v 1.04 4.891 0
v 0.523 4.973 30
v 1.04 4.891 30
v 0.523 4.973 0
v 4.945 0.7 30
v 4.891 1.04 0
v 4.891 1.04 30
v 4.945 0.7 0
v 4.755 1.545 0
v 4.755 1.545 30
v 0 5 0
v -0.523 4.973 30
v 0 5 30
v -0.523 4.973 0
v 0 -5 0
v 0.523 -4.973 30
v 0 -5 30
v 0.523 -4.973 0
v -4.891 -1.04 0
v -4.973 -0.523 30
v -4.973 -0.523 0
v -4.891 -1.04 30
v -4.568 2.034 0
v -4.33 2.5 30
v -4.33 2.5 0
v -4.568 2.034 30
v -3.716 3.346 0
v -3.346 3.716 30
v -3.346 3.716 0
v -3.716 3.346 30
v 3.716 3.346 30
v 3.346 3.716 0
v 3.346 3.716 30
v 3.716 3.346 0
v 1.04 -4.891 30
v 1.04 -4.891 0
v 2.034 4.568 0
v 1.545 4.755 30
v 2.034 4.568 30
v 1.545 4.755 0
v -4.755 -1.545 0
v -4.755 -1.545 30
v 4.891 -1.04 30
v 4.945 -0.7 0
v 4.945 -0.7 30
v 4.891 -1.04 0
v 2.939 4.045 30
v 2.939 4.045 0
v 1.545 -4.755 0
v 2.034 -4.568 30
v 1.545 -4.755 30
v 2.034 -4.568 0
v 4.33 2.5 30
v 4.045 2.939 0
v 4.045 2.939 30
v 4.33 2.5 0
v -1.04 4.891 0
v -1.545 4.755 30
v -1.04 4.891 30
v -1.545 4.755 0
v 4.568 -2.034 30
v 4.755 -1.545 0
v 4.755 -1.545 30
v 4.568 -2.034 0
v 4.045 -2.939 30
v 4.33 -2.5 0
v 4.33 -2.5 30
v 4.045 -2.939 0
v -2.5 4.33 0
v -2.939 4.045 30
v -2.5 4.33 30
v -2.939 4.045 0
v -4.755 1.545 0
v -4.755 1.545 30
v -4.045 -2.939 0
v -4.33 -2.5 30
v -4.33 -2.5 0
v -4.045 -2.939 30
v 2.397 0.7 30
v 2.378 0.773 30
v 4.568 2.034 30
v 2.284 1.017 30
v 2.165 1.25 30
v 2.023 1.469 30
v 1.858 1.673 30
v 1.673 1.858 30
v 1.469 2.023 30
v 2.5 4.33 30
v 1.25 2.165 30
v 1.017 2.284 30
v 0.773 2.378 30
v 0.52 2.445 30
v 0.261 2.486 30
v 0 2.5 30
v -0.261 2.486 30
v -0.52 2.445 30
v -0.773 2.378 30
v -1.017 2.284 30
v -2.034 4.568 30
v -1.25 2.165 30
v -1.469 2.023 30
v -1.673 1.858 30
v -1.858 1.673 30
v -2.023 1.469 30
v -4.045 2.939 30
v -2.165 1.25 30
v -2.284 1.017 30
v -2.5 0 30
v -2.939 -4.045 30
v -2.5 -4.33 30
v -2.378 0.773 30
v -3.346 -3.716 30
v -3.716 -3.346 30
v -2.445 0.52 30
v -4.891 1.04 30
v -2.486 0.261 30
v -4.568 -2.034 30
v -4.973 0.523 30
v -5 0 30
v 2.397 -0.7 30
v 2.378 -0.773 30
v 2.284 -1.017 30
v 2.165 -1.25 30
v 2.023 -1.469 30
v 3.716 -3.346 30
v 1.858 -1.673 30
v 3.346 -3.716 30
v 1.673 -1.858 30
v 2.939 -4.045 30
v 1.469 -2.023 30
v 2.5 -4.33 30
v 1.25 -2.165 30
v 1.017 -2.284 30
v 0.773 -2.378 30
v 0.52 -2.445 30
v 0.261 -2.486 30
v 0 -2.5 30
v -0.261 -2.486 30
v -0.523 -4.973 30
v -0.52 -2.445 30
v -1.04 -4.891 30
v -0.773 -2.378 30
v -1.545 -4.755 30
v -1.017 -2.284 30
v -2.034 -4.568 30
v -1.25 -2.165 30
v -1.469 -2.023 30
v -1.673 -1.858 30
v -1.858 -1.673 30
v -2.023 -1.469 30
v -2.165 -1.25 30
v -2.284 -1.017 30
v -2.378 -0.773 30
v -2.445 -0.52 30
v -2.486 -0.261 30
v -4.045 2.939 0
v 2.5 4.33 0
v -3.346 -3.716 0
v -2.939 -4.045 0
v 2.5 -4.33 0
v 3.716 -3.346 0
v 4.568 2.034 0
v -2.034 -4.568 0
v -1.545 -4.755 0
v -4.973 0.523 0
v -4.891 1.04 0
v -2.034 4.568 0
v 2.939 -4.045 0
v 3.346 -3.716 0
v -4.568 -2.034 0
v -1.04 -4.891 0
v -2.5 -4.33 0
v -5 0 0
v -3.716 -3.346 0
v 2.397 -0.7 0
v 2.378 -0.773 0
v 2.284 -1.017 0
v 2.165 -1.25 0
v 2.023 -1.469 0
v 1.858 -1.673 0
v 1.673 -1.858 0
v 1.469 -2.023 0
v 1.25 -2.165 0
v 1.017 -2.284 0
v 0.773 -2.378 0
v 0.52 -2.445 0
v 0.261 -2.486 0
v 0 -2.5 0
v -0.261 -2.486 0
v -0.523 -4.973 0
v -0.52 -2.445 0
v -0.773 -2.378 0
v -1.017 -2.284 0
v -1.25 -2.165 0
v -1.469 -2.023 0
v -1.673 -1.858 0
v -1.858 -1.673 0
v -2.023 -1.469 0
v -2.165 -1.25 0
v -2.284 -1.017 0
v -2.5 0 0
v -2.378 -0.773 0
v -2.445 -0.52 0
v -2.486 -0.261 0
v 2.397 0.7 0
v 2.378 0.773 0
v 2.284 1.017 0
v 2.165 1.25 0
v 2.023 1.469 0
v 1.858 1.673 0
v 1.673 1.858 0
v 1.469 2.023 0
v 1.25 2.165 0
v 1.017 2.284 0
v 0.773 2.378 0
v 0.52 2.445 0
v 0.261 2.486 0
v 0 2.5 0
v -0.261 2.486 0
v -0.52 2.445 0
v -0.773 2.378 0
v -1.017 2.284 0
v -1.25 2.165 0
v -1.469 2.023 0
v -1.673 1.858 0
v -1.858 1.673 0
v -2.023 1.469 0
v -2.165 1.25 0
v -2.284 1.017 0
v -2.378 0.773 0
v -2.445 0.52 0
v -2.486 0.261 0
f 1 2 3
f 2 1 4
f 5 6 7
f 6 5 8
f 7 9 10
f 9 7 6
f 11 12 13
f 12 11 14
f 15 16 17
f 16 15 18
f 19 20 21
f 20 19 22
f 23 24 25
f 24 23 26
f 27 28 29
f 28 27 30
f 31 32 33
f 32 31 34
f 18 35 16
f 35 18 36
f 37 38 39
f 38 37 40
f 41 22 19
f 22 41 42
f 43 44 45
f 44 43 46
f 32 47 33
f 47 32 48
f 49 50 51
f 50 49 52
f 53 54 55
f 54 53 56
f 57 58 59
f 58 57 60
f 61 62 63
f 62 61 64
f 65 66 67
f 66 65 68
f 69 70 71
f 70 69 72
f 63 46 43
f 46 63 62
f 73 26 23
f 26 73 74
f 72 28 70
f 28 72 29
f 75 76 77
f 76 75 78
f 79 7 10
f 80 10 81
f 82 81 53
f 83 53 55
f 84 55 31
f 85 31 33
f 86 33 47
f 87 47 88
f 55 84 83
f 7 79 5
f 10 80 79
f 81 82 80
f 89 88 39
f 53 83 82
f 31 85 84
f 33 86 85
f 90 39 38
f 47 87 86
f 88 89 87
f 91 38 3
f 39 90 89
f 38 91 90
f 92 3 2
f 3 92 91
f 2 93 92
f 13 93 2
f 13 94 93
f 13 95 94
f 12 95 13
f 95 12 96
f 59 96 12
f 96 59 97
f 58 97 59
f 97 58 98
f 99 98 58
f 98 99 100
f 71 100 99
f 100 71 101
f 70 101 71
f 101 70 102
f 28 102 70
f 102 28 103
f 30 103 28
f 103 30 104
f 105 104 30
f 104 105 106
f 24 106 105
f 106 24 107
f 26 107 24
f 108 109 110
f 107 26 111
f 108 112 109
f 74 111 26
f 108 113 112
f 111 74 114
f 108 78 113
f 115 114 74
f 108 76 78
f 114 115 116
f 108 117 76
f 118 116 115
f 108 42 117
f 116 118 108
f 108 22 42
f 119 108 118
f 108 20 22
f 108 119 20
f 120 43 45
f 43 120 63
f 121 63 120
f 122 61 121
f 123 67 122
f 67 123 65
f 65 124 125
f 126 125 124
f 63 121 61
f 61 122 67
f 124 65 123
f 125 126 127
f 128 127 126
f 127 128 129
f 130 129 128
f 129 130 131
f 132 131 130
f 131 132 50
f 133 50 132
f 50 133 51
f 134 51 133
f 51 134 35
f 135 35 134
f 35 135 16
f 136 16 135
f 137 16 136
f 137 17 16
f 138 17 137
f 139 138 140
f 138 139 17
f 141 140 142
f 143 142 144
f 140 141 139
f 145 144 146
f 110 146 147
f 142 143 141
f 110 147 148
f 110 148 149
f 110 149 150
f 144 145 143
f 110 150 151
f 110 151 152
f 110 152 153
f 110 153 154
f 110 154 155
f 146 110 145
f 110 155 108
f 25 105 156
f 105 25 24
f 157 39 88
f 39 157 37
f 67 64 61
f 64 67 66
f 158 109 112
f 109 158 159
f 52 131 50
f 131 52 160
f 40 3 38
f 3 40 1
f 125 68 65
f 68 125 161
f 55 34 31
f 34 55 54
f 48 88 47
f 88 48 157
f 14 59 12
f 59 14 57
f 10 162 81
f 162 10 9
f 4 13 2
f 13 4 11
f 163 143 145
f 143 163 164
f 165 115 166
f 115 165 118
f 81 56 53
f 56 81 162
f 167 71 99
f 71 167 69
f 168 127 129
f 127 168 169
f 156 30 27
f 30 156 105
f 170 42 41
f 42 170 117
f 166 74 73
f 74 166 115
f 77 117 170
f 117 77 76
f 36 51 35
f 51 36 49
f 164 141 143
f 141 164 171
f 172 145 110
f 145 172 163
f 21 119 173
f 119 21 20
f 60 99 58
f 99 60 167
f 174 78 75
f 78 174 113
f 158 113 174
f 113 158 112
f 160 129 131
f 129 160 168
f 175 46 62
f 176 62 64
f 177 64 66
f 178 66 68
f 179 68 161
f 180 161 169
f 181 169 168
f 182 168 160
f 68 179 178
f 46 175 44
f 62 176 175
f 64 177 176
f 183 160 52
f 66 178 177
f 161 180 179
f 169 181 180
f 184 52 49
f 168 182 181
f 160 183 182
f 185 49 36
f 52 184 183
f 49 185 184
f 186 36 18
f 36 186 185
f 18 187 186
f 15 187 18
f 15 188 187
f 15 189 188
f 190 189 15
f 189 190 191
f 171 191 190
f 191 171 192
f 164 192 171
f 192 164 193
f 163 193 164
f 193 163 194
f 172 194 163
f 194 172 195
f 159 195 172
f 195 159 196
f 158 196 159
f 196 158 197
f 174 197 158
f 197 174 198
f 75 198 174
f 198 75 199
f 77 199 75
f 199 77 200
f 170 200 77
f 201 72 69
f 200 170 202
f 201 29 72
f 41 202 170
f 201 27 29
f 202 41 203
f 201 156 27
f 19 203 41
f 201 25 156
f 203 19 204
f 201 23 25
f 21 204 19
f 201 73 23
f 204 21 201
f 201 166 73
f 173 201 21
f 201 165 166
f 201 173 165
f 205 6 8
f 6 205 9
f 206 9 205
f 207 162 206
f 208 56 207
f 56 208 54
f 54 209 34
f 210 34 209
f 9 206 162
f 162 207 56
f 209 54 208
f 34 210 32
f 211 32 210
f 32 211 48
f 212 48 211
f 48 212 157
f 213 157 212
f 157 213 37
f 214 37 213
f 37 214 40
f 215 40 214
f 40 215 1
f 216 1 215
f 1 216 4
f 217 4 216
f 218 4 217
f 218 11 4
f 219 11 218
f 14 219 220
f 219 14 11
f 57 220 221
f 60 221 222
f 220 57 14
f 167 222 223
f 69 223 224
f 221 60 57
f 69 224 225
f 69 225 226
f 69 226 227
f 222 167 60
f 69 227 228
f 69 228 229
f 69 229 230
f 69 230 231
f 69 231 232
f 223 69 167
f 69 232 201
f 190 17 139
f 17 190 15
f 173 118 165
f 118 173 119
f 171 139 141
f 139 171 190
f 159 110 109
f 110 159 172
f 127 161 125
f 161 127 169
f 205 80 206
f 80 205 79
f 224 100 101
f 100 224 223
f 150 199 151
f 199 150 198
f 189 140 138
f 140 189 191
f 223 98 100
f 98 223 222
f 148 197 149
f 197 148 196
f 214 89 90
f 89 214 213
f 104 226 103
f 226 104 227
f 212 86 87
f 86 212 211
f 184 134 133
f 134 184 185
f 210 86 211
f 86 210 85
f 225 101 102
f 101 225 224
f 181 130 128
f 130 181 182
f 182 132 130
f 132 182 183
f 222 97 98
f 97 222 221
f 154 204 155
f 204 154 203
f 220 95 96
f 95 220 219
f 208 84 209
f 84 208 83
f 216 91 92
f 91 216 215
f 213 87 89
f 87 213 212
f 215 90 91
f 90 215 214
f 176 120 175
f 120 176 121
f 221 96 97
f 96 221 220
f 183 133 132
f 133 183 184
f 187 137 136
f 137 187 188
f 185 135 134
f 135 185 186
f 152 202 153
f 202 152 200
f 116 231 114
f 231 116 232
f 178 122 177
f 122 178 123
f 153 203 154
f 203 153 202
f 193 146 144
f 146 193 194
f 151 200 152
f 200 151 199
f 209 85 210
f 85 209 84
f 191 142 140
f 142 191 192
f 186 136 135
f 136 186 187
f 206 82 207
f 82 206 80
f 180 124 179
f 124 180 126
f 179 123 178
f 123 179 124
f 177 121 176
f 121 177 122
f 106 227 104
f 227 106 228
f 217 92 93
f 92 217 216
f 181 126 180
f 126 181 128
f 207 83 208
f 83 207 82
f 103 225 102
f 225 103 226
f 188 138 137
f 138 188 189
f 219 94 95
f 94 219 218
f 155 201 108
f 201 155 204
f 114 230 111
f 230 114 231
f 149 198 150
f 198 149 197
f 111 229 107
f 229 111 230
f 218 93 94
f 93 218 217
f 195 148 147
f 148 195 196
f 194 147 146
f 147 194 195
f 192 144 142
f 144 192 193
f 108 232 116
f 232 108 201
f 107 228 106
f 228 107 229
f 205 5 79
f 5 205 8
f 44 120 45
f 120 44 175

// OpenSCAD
// Slotted roll pin.
$fn = 60;
eps = 0.02;
inner_d = 5;
outer_d = 10;
length = 30;
slot = 1.4;
difference() {
    cylinder(d=outer_d,h=length);
    translate([0,0,-eps]) cylinder(d=inner_d,h=length+2*eps);
    translate([0,-slot/2,-eps]) cube([outer_d/2+eps,slot,length+2*eps]);
}
